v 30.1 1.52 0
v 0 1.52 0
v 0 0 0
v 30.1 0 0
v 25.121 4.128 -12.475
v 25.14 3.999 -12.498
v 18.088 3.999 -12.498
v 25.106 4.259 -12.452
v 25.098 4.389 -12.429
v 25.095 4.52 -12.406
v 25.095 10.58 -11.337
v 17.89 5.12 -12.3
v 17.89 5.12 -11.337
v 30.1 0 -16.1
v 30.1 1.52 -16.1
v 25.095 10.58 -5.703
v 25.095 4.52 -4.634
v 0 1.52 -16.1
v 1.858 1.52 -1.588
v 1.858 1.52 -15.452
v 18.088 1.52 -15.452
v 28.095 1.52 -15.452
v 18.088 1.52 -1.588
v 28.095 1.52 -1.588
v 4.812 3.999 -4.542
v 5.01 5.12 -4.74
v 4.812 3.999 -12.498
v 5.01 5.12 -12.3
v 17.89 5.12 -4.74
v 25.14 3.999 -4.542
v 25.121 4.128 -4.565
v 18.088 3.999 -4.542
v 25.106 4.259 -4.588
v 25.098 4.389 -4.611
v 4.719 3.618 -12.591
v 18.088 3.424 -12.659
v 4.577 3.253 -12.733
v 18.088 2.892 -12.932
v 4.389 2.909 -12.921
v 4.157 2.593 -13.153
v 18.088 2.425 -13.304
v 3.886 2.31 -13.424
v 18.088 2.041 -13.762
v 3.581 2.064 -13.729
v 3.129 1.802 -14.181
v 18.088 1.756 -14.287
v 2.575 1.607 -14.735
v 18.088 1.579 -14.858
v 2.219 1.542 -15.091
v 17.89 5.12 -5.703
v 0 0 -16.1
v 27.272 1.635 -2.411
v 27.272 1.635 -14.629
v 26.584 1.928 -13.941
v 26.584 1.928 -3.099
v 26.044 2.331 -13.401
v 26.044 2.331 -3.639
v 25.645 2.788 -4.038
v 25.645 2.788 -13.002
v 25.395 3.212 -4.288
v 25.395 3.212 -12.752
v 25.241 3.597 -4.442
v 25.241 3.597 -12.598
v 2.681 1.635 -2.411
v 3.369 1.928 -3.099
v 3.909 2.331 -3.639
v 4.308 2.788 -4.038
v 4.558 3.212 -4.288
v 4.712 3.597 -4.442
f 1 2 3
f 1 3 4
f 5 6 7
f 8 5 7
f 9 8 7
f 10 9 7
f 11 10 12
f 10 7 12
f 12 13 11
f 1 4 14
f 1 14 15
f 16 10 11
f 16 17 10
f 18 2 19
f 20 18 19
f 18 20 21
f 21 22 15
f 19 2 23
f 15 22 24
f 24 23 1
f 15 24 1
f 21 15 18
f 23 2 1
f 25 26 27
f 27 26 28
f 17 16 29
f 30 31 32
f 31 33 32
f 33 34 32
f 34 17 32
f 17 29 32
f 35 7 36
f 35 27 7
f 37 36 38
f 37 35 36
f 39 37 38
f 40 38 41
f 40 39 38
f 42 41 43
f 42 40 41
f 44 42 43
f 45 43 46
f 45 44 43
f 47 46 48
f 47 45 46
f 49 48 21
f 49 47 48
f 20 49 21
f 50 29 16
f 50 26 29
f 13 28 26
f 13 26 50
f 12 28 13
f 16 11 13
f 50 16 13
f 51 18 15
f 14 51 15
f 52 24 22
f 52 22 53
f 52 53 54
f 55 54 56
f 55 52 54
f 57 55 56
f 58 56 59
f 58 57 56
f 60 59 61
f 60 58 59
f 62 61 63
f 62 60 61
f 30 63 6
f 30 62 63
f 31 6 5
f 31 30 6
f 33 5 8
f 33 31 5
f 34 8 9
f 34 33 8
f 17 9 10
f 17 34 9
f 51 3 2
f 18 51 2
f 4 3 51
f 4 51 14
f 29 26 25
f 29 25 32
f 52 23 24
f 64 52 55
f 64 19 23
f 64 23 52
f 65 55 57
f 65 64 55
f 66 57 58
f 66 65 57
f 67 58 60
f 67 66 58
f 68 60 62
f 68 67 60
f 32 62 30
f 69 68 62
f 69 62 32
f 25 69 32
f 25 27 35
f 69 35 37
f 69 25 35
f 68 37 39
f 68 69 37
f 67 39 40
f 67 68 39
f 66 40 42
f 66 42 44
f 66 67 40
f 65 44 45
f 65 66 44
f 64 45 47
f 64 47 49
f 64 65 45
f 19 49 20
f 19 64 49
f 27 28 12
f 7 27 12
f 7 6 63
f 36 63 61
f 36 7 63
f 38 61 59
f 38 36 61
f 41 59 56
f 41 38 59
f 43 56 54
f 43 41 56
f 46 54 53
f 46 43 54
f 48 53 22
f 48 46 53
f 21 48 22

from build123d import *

# Parameters (mm, degrees)
SKETCH1_W             = 30.1
SKETCH1_H             = 1.52
BOSS_EXTRUDE1_DEPTH   = 16.1
BOSS_EXTRUDE2_START   = 3.6
SKETCH2_W             = 12.88
SKETCH2_H             = 7.56
BOSS_EXTRUDE2_DEPTH   = 3.68
BOSS_EXTRUDE2_DRAFT   = 10
BOSS_EXTRUDE3_START   = -11.337254685
BOSS_EXTRUDE3_DEPTH   = 5.63450937
BOSS_EXTRUDE3_START_2 = 17.89
BOSS_EXTRUDE3_2_DEPTH = 7.204859471
BOSS_EXTRUDE3_START_3 = 1
BOSS_EXTRUDE3_3_DEPTH = 5.72461499
FILLET1_R             = 3


with BuildPart() as part:
    # Sketch1 → Boss-Extrude1 (new body)
    with BuildSketch(Plane.XY):
        with Locations((15.05, 0.76)):
            Rectangle(SKETCH1_W, SKETCH1_H)
    extrude(amount=-BOSS_EXTRUDE1_DEPTH)


with BuildPart() as boss_extrude2_tool:
    # Sketch2 → Boss-Extrude2 (with draft: the straight prism first)
    with BuildSketch(Plane(origin=(0, 1.52, 0), x_dir=(1, 0, 0), z_dir=(0, 1, 0)).offset(BOSS_EXTRUDE2_START)):
        with Locations((11.45, 8.52)):
            Rectangle(SKETCH2_W, SKETCH2_H)
    extrude(amount=-BOSS_EXTRUDE2_DEPTH)
    # Boss-Extrude2: the draft: its side faces are tilted about the plane it starts from
    boss_extrude2_sides = [boss_extrude2_tool.faces().sort_by_distance(p)[0] for p in [
        (5.01, 3.28, -8.52),
        (11.45, 3.28, -4.74),
        (17.89, 3.28, -8.52),
        (11.45, 3.28, -12.3),
    ]]
    draft(boss_extrude2_sides, Plane(origin=(0, 1.52, 0), x_dir=(1, 0, 0), z_dir=(0, 1, 0)).offset(BOSS_EXTRUDE2_START), BOSS_EXTRUDE2_DRAFT)


with BuildPart() as part_1:
    add(part.part)

    # Boss-Extrude2: add boss_extrude2_tool
    add(boss_extrude2_tool.part)

    # Boss-Extrude3: read off the stored shape, not the designer's step
    # Boss-Extrude3 outline → Boss-Extrude3 (add)
    with BuildSketch(Plane.XY.offset(BOSS_EXTRUDE3_START)):
        Polygon((18.524777131, 1.52), (25.094859471, 1.52), (25.094859471, 10.58), (17.89, 5.12), align=None)
    extrude(amount=BOSS_EXTRUDE3_DEPTH)

    # Boss-Extrude3 2 outline → Boss-Extrude3 2 (add)
    with BuildSketch(Plane.YZ.offset(BOSS_EXTRUDE3_START_2)):
        Polygon((1.52, -11.337254685), (1.52, -12.934777131), (10.58, -11.337254685), align=None)
        Polygon((1.52, -4.105222869), (1.52, -5.702745315), (10.58, -5.702745315), align=None)
    extrude(amount=BOSS_EXTRUDE3_2_DEPTH)

    # Boss-Extrude3 3 outline → Boss-Extrude3 3 (cut)
    with BuildSketch(Plane(origin=(0, 0, 0), x_dir=(0.7969977291170371, 0.6039823008849562, 0), z_dir=(0.6039823008849562, -0.7969977291170373, 0)).offset(BOSS_EXTRUDE3_START_3)):
        Polygon((26.390678754, -11.337254685), (26.390678754, -5.702745315), (17.350678754, -4.74), (17.350678754, -12.3), align=None)
    extrude(amount=BOSS_EXTRUDE3_3_DEPTH, mode=Mode.SUBTRACT)

    # Fillet1
    fillet1_edges = [part_1.edges().sort_by_distance(p)[0] for p in [
        (11.45, 1.52, -4.105222869),
        (11.45, 1.52, -12.934777131),
        (4.375222869, 1.52, -8.52),
        (25.094859471, 1.52, -8.52),
    ]]
    fillet(fillet1_edges, radius=FILLET1_R)


solid = part_1.part
